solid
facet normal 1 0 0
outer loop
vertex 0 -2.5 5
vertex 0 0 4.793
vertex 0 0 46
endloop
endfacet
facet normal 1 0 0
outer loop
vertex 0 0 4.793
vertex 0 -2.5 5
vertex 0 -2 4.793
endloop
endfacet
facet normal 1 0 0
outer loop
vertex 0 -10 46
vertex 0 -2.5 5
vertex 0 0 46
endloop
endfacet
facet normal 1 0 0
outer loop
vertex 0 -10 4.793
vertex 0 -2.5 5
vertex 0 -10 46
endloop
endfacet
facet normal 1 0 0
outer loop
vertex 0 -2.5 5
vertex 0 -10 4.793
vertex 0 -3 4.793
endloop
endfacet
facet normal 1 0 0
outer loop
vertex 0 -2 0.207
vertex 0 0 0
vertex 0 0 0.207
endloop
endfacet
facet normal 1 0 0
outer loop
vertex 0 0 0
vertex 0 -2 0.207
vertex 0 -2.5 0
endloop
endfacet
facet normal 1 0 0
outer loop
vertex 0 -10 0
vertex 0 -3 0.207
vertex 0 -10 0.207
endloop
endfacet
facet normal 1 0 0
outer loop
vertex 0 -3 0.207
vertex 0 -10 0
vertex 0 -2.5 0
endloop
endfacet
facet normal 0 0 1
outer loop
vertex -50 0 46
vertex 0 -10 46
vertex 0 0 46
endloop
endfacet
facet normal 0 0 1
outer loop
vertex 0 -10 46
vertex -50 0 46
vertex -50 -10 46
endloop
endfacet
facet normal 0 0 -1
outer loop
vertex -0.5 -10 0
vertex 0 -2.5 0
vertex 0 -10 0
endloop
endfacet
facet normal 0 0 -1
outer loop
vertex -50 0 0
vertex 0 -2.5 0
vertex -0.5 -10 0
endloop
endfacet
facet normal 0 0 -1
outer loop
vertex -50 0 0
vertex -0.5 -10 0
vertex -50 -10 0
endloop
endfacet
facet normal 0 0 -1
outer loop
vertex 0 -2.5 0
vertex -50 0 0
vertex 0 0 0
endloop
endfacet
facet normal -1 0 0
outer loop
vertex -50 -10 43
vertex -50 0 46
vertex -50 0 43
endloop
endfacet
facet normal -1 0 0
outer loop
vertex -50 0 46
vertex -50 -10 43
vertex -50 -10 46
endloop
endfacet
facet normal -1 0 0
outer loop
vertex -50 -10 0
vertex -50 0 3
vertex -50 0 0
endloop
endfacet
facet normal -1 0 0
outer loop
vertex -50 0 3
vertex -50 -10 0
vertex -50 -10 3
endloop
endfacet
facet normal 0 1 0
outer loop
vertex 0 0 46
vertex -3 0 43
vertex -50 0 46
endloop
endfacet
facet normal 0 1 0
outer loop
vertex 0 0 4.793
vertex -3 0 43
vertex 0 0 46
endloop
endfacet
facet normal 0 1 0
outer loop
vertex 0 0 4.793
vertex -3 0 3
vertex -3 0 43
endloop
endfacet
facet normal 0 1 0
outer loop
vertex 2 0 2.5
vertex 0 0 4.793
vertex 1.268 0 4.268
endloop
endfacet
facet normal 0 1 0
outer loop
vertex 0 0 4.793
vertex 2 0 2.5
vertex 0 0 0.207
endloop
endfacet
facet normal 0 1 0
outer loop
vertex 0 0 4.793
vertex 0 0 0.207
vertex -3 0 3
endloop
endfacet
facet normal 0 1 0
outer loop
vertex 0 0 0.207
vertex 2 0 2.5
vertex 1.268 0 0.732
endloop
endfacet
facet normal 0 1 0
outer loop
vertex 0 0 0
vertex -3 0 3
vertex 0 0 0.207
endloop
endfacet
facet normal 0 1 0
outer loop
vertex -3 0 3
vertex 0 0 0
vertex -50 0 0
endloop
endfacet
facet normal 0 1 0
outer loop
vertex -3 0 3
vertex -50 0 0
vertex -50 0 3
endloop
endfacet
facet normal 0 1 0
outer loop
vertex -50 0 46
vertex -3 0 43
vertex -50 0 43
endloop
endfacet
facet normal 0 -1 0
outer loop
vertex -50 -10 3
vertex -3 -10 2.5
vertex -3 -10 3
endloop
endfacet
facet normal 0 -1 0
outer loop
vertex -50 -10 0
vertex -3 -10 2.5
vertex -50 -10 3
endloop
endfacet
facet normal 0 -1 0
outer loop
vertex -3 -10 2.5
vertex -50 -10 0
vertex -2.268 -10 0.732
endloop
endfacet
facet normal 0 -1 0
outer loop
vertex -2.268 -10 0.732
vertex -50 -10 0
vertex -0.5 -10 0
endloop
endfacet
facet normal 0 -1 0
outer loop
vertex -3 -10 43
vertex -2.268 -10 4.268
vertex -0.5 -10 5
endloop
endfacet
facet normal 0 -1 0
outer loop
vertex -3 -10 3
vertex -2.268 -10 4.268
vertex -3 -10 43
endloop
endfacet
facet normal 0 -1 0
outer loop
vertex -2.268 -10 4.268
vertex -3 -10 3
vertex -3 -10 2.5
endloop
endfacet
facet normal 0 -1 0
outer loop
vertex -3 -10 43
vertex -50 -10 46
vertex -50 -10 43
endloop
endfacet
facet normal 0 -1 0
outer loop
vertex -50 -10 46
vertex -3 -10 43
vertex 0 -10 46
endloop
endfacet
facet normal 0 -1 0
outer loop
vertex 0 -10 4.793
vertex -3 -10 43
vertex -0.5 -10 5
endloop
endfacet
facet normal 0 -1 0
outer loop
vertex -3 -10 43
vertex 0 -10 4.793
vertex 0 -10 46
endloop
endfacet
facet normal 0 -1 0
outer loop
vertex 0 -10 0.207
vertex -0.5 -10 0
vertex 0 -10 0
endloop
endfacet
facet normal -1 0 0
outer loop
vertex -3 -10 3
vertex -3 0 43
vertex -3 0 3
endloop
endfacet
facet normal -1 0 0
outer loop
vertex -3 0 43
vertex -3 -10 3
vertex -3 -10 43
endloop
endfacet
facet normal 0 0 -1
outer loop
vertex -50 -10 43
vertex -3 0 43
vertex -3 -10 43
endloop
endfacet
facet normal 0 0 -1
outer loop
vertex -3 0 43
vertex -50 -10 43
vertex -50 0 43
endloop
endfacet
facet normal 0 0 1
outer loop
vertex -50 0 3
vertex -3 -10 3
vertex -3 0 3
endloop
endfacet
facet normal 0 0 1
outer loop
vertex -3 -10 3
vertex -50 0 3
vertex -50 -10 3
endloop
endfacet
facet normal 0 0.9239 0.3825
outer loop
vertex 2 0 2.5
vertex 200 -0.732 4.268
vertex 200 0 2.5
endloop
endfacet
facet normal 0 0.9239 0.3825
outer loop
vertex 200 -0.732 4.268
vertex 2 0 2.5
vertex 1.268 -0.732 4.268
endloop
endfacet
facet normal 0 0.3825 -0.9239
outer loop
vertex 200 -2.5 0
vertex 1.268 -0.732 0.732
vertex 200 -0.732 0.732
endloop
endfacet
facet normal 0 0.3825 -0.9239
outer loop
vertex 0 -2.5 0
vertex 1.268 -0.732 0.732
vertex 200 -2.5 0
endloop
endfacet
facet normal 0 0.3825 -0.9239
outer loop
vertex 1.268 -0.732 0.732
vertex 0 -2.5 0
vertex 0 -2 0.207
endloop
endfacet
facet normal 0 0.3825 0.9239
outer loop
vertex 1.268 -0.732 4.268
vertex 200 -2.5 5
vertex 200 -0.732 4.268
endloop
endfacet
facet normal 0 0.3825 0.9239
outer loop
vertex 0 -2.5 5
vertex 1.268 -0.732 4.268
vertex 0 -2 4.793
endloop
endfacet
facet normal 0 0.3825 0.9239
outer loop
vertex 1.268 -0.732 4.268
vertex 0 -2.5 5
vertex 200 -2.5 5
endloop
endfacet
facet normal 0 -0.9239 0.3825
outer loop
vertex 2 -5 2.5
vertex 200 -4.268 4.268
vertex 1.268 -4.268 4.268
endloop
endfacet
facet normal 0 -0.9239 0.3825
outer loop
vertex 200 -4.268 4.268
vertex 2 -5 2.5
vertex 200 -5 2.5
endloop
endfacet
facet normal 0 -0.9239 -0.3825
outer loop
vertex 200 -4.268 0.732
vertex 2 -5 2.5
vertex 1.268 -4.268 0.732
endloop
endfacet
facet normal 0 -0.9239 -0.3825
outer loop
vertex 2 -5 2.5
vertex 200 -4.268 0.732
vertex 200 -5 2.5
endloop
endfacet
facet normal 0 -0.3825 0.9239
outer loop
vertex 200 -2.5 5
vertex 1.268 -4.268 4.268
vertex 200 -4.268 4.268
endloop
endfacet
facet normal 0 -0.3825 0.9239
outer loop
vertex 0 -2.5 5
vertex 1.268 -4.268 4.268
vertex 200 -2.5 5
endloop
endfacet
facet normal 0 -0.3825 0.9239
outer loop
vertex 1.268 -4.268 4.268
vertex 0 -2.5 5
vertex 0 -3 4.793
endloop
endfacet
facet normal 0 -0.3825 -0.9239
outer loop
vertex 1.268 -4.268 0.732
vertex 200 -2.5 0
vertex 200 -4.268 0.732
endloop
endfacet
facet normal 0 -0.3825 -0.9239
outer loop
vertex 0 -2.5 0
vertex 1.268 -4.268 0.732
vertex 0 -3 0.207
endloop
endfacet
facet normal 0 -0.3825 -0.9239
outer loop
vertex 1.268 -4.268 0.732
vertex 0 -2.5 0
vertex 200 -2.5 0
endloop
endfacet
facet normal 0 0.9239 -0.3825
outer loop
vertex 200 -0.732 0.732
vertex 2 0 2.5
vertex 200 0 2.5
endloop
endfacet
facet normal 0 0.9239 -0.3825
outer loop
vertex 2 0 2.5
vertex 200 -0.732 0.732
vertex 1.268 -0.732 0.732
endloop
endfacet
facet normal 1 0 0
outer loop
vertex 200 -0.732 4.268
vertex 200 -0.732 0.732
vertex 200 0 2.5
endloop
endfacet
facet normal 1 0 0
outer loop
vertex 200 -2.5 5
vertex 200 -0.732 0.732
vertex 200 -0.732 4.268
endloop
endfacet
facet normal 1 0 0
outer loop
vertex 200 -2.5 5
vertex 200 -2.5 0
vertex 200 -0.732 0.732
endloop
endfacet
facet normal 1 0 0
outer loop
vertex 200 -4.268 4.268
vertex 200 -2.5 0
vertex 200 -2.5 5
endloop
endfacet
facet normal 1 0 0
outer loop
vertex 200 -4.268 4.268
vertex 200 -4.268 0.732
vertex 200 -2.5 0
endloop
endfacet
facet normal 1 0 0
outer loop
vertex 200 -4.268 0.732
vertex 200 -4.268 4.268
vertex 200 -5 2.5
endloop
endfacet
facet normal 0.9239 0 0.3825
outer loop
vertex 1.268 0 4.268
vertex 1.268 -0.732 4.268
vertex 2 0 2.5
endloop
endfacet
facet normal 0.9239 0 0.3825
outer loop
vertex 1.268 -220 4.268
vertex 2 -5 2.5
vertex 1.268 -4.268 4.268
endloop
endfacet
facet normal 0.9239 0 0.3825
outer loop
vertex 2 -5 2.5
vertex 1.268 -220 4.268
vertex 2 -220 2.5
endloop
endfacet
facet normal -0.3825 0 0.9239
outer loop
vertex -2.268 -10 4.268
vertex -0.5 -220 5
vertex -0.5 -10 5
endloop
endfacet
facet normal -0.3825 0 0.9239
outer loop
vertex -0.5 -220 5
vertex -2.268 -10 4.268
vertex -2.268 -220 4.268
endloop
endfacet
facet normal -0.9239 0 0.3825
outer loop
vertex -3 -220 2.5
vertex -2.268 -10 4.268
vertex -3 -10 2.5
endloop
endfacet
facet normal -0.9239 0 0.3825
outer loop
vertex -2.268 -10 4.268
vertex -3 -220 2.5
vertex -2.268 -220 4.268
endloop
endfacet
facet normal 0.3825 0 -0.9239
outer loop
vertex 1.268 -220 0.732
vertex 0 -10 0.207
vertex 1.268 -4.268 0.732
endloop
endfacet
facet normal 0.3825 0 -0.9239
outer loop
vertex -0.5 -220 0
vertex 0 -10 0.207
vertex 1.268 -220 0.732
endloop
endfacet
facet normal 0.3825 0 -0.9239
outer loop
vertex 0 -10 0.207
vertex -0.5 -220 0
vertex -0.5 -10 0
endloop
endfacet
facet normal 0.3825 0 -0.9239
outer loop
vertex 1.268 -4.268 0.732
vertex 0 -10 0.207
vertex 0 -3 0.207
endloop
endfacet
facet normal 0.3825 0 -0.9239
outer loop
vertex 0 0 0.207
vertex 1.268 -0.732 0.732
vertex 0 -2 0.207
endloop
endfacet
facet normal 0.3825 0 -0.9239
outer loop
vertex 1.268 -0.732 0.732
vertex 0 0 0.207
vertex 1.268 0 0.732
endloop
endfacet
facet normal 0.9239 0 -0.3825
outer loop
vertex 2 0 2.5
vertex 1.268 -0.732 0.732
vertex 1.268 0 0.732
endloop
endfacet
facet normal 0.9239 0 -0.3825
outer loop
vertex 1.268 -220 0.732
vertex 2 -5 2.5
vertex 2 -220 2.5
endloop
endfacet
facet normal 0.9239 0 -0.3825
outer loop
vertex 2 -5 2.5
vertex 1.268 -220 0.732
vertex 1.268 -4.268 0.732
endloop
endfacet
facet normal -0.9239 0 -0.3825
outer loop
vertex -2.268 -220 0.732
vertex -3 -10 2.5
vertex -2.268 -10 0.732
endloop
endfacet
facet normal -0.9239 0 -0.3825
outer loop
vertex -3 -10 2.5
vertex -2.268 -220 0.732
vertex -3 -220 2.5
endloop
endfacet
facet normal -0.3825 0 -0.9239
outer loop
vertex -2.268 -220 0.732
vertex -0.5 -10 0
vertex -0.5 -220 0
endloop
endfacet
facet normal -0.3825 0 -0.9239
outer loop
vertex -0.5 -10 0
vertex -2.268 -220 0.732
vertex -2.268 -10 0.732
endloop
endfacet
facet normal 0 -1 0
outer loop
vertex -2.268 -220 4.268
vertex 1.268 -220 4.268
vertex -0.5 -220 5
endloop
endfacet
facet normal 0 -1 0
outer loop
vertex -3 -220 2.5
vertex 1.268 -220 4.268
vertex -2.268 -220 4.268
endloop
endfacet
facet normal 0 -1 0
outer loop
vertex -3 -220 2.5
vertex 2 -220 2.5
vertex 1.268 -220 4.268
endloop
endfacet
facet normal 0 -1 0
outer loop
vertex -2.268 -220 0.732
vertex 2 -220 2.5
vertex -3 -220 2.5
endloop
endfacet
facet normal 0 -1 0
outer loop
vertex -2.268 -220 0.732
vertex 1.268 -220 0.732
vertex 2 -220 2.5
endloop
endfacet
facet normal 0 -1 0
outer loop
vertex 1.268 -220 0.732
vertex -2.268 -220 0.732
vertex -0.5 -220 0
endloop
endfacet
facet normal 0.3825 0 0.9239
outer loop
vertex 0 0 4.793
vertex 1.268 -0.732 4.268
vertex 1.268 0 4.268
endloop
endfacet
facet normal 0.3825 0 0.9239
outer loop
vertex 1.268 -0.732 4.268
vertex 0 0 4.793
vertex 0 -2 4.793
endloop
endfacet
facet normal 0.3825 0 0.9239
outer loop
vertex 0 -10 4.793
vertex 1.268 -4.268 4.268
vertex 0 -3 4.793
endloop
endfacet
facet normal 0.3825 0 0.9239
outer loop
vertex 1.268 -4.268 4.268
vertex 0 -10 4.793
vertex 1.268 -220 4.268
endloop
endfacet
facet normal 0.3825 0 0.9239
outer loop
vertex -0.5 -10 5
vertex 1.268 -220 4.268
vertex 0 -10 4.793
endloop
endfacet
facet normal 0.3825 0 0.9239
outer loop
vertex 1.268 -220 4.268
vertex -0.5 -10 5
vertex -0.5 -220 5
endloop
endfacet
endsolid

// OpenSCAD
t = 3;
tabletop = [1, 220, 40];
grip = [50, 10, tabletop.z + 2*t];
r = 2.5;
triangle = [200, tabletop.y];

module base(){
    translate([-grip.x, -grip.y, 0])
    difference(){
        cube(grip);
        translate([0, 0, t])
        cube(grip - [t, 0, 2*t]);
    }
    
    translate([0, -r, r])
    rotate([0, 90, 0])
    cylinder(triangle[0], r, r);

    translate([r - t, 0, r])
    rotate([90, 0, 0])
    cylinder(triangle[1], r, r);
}

base();
